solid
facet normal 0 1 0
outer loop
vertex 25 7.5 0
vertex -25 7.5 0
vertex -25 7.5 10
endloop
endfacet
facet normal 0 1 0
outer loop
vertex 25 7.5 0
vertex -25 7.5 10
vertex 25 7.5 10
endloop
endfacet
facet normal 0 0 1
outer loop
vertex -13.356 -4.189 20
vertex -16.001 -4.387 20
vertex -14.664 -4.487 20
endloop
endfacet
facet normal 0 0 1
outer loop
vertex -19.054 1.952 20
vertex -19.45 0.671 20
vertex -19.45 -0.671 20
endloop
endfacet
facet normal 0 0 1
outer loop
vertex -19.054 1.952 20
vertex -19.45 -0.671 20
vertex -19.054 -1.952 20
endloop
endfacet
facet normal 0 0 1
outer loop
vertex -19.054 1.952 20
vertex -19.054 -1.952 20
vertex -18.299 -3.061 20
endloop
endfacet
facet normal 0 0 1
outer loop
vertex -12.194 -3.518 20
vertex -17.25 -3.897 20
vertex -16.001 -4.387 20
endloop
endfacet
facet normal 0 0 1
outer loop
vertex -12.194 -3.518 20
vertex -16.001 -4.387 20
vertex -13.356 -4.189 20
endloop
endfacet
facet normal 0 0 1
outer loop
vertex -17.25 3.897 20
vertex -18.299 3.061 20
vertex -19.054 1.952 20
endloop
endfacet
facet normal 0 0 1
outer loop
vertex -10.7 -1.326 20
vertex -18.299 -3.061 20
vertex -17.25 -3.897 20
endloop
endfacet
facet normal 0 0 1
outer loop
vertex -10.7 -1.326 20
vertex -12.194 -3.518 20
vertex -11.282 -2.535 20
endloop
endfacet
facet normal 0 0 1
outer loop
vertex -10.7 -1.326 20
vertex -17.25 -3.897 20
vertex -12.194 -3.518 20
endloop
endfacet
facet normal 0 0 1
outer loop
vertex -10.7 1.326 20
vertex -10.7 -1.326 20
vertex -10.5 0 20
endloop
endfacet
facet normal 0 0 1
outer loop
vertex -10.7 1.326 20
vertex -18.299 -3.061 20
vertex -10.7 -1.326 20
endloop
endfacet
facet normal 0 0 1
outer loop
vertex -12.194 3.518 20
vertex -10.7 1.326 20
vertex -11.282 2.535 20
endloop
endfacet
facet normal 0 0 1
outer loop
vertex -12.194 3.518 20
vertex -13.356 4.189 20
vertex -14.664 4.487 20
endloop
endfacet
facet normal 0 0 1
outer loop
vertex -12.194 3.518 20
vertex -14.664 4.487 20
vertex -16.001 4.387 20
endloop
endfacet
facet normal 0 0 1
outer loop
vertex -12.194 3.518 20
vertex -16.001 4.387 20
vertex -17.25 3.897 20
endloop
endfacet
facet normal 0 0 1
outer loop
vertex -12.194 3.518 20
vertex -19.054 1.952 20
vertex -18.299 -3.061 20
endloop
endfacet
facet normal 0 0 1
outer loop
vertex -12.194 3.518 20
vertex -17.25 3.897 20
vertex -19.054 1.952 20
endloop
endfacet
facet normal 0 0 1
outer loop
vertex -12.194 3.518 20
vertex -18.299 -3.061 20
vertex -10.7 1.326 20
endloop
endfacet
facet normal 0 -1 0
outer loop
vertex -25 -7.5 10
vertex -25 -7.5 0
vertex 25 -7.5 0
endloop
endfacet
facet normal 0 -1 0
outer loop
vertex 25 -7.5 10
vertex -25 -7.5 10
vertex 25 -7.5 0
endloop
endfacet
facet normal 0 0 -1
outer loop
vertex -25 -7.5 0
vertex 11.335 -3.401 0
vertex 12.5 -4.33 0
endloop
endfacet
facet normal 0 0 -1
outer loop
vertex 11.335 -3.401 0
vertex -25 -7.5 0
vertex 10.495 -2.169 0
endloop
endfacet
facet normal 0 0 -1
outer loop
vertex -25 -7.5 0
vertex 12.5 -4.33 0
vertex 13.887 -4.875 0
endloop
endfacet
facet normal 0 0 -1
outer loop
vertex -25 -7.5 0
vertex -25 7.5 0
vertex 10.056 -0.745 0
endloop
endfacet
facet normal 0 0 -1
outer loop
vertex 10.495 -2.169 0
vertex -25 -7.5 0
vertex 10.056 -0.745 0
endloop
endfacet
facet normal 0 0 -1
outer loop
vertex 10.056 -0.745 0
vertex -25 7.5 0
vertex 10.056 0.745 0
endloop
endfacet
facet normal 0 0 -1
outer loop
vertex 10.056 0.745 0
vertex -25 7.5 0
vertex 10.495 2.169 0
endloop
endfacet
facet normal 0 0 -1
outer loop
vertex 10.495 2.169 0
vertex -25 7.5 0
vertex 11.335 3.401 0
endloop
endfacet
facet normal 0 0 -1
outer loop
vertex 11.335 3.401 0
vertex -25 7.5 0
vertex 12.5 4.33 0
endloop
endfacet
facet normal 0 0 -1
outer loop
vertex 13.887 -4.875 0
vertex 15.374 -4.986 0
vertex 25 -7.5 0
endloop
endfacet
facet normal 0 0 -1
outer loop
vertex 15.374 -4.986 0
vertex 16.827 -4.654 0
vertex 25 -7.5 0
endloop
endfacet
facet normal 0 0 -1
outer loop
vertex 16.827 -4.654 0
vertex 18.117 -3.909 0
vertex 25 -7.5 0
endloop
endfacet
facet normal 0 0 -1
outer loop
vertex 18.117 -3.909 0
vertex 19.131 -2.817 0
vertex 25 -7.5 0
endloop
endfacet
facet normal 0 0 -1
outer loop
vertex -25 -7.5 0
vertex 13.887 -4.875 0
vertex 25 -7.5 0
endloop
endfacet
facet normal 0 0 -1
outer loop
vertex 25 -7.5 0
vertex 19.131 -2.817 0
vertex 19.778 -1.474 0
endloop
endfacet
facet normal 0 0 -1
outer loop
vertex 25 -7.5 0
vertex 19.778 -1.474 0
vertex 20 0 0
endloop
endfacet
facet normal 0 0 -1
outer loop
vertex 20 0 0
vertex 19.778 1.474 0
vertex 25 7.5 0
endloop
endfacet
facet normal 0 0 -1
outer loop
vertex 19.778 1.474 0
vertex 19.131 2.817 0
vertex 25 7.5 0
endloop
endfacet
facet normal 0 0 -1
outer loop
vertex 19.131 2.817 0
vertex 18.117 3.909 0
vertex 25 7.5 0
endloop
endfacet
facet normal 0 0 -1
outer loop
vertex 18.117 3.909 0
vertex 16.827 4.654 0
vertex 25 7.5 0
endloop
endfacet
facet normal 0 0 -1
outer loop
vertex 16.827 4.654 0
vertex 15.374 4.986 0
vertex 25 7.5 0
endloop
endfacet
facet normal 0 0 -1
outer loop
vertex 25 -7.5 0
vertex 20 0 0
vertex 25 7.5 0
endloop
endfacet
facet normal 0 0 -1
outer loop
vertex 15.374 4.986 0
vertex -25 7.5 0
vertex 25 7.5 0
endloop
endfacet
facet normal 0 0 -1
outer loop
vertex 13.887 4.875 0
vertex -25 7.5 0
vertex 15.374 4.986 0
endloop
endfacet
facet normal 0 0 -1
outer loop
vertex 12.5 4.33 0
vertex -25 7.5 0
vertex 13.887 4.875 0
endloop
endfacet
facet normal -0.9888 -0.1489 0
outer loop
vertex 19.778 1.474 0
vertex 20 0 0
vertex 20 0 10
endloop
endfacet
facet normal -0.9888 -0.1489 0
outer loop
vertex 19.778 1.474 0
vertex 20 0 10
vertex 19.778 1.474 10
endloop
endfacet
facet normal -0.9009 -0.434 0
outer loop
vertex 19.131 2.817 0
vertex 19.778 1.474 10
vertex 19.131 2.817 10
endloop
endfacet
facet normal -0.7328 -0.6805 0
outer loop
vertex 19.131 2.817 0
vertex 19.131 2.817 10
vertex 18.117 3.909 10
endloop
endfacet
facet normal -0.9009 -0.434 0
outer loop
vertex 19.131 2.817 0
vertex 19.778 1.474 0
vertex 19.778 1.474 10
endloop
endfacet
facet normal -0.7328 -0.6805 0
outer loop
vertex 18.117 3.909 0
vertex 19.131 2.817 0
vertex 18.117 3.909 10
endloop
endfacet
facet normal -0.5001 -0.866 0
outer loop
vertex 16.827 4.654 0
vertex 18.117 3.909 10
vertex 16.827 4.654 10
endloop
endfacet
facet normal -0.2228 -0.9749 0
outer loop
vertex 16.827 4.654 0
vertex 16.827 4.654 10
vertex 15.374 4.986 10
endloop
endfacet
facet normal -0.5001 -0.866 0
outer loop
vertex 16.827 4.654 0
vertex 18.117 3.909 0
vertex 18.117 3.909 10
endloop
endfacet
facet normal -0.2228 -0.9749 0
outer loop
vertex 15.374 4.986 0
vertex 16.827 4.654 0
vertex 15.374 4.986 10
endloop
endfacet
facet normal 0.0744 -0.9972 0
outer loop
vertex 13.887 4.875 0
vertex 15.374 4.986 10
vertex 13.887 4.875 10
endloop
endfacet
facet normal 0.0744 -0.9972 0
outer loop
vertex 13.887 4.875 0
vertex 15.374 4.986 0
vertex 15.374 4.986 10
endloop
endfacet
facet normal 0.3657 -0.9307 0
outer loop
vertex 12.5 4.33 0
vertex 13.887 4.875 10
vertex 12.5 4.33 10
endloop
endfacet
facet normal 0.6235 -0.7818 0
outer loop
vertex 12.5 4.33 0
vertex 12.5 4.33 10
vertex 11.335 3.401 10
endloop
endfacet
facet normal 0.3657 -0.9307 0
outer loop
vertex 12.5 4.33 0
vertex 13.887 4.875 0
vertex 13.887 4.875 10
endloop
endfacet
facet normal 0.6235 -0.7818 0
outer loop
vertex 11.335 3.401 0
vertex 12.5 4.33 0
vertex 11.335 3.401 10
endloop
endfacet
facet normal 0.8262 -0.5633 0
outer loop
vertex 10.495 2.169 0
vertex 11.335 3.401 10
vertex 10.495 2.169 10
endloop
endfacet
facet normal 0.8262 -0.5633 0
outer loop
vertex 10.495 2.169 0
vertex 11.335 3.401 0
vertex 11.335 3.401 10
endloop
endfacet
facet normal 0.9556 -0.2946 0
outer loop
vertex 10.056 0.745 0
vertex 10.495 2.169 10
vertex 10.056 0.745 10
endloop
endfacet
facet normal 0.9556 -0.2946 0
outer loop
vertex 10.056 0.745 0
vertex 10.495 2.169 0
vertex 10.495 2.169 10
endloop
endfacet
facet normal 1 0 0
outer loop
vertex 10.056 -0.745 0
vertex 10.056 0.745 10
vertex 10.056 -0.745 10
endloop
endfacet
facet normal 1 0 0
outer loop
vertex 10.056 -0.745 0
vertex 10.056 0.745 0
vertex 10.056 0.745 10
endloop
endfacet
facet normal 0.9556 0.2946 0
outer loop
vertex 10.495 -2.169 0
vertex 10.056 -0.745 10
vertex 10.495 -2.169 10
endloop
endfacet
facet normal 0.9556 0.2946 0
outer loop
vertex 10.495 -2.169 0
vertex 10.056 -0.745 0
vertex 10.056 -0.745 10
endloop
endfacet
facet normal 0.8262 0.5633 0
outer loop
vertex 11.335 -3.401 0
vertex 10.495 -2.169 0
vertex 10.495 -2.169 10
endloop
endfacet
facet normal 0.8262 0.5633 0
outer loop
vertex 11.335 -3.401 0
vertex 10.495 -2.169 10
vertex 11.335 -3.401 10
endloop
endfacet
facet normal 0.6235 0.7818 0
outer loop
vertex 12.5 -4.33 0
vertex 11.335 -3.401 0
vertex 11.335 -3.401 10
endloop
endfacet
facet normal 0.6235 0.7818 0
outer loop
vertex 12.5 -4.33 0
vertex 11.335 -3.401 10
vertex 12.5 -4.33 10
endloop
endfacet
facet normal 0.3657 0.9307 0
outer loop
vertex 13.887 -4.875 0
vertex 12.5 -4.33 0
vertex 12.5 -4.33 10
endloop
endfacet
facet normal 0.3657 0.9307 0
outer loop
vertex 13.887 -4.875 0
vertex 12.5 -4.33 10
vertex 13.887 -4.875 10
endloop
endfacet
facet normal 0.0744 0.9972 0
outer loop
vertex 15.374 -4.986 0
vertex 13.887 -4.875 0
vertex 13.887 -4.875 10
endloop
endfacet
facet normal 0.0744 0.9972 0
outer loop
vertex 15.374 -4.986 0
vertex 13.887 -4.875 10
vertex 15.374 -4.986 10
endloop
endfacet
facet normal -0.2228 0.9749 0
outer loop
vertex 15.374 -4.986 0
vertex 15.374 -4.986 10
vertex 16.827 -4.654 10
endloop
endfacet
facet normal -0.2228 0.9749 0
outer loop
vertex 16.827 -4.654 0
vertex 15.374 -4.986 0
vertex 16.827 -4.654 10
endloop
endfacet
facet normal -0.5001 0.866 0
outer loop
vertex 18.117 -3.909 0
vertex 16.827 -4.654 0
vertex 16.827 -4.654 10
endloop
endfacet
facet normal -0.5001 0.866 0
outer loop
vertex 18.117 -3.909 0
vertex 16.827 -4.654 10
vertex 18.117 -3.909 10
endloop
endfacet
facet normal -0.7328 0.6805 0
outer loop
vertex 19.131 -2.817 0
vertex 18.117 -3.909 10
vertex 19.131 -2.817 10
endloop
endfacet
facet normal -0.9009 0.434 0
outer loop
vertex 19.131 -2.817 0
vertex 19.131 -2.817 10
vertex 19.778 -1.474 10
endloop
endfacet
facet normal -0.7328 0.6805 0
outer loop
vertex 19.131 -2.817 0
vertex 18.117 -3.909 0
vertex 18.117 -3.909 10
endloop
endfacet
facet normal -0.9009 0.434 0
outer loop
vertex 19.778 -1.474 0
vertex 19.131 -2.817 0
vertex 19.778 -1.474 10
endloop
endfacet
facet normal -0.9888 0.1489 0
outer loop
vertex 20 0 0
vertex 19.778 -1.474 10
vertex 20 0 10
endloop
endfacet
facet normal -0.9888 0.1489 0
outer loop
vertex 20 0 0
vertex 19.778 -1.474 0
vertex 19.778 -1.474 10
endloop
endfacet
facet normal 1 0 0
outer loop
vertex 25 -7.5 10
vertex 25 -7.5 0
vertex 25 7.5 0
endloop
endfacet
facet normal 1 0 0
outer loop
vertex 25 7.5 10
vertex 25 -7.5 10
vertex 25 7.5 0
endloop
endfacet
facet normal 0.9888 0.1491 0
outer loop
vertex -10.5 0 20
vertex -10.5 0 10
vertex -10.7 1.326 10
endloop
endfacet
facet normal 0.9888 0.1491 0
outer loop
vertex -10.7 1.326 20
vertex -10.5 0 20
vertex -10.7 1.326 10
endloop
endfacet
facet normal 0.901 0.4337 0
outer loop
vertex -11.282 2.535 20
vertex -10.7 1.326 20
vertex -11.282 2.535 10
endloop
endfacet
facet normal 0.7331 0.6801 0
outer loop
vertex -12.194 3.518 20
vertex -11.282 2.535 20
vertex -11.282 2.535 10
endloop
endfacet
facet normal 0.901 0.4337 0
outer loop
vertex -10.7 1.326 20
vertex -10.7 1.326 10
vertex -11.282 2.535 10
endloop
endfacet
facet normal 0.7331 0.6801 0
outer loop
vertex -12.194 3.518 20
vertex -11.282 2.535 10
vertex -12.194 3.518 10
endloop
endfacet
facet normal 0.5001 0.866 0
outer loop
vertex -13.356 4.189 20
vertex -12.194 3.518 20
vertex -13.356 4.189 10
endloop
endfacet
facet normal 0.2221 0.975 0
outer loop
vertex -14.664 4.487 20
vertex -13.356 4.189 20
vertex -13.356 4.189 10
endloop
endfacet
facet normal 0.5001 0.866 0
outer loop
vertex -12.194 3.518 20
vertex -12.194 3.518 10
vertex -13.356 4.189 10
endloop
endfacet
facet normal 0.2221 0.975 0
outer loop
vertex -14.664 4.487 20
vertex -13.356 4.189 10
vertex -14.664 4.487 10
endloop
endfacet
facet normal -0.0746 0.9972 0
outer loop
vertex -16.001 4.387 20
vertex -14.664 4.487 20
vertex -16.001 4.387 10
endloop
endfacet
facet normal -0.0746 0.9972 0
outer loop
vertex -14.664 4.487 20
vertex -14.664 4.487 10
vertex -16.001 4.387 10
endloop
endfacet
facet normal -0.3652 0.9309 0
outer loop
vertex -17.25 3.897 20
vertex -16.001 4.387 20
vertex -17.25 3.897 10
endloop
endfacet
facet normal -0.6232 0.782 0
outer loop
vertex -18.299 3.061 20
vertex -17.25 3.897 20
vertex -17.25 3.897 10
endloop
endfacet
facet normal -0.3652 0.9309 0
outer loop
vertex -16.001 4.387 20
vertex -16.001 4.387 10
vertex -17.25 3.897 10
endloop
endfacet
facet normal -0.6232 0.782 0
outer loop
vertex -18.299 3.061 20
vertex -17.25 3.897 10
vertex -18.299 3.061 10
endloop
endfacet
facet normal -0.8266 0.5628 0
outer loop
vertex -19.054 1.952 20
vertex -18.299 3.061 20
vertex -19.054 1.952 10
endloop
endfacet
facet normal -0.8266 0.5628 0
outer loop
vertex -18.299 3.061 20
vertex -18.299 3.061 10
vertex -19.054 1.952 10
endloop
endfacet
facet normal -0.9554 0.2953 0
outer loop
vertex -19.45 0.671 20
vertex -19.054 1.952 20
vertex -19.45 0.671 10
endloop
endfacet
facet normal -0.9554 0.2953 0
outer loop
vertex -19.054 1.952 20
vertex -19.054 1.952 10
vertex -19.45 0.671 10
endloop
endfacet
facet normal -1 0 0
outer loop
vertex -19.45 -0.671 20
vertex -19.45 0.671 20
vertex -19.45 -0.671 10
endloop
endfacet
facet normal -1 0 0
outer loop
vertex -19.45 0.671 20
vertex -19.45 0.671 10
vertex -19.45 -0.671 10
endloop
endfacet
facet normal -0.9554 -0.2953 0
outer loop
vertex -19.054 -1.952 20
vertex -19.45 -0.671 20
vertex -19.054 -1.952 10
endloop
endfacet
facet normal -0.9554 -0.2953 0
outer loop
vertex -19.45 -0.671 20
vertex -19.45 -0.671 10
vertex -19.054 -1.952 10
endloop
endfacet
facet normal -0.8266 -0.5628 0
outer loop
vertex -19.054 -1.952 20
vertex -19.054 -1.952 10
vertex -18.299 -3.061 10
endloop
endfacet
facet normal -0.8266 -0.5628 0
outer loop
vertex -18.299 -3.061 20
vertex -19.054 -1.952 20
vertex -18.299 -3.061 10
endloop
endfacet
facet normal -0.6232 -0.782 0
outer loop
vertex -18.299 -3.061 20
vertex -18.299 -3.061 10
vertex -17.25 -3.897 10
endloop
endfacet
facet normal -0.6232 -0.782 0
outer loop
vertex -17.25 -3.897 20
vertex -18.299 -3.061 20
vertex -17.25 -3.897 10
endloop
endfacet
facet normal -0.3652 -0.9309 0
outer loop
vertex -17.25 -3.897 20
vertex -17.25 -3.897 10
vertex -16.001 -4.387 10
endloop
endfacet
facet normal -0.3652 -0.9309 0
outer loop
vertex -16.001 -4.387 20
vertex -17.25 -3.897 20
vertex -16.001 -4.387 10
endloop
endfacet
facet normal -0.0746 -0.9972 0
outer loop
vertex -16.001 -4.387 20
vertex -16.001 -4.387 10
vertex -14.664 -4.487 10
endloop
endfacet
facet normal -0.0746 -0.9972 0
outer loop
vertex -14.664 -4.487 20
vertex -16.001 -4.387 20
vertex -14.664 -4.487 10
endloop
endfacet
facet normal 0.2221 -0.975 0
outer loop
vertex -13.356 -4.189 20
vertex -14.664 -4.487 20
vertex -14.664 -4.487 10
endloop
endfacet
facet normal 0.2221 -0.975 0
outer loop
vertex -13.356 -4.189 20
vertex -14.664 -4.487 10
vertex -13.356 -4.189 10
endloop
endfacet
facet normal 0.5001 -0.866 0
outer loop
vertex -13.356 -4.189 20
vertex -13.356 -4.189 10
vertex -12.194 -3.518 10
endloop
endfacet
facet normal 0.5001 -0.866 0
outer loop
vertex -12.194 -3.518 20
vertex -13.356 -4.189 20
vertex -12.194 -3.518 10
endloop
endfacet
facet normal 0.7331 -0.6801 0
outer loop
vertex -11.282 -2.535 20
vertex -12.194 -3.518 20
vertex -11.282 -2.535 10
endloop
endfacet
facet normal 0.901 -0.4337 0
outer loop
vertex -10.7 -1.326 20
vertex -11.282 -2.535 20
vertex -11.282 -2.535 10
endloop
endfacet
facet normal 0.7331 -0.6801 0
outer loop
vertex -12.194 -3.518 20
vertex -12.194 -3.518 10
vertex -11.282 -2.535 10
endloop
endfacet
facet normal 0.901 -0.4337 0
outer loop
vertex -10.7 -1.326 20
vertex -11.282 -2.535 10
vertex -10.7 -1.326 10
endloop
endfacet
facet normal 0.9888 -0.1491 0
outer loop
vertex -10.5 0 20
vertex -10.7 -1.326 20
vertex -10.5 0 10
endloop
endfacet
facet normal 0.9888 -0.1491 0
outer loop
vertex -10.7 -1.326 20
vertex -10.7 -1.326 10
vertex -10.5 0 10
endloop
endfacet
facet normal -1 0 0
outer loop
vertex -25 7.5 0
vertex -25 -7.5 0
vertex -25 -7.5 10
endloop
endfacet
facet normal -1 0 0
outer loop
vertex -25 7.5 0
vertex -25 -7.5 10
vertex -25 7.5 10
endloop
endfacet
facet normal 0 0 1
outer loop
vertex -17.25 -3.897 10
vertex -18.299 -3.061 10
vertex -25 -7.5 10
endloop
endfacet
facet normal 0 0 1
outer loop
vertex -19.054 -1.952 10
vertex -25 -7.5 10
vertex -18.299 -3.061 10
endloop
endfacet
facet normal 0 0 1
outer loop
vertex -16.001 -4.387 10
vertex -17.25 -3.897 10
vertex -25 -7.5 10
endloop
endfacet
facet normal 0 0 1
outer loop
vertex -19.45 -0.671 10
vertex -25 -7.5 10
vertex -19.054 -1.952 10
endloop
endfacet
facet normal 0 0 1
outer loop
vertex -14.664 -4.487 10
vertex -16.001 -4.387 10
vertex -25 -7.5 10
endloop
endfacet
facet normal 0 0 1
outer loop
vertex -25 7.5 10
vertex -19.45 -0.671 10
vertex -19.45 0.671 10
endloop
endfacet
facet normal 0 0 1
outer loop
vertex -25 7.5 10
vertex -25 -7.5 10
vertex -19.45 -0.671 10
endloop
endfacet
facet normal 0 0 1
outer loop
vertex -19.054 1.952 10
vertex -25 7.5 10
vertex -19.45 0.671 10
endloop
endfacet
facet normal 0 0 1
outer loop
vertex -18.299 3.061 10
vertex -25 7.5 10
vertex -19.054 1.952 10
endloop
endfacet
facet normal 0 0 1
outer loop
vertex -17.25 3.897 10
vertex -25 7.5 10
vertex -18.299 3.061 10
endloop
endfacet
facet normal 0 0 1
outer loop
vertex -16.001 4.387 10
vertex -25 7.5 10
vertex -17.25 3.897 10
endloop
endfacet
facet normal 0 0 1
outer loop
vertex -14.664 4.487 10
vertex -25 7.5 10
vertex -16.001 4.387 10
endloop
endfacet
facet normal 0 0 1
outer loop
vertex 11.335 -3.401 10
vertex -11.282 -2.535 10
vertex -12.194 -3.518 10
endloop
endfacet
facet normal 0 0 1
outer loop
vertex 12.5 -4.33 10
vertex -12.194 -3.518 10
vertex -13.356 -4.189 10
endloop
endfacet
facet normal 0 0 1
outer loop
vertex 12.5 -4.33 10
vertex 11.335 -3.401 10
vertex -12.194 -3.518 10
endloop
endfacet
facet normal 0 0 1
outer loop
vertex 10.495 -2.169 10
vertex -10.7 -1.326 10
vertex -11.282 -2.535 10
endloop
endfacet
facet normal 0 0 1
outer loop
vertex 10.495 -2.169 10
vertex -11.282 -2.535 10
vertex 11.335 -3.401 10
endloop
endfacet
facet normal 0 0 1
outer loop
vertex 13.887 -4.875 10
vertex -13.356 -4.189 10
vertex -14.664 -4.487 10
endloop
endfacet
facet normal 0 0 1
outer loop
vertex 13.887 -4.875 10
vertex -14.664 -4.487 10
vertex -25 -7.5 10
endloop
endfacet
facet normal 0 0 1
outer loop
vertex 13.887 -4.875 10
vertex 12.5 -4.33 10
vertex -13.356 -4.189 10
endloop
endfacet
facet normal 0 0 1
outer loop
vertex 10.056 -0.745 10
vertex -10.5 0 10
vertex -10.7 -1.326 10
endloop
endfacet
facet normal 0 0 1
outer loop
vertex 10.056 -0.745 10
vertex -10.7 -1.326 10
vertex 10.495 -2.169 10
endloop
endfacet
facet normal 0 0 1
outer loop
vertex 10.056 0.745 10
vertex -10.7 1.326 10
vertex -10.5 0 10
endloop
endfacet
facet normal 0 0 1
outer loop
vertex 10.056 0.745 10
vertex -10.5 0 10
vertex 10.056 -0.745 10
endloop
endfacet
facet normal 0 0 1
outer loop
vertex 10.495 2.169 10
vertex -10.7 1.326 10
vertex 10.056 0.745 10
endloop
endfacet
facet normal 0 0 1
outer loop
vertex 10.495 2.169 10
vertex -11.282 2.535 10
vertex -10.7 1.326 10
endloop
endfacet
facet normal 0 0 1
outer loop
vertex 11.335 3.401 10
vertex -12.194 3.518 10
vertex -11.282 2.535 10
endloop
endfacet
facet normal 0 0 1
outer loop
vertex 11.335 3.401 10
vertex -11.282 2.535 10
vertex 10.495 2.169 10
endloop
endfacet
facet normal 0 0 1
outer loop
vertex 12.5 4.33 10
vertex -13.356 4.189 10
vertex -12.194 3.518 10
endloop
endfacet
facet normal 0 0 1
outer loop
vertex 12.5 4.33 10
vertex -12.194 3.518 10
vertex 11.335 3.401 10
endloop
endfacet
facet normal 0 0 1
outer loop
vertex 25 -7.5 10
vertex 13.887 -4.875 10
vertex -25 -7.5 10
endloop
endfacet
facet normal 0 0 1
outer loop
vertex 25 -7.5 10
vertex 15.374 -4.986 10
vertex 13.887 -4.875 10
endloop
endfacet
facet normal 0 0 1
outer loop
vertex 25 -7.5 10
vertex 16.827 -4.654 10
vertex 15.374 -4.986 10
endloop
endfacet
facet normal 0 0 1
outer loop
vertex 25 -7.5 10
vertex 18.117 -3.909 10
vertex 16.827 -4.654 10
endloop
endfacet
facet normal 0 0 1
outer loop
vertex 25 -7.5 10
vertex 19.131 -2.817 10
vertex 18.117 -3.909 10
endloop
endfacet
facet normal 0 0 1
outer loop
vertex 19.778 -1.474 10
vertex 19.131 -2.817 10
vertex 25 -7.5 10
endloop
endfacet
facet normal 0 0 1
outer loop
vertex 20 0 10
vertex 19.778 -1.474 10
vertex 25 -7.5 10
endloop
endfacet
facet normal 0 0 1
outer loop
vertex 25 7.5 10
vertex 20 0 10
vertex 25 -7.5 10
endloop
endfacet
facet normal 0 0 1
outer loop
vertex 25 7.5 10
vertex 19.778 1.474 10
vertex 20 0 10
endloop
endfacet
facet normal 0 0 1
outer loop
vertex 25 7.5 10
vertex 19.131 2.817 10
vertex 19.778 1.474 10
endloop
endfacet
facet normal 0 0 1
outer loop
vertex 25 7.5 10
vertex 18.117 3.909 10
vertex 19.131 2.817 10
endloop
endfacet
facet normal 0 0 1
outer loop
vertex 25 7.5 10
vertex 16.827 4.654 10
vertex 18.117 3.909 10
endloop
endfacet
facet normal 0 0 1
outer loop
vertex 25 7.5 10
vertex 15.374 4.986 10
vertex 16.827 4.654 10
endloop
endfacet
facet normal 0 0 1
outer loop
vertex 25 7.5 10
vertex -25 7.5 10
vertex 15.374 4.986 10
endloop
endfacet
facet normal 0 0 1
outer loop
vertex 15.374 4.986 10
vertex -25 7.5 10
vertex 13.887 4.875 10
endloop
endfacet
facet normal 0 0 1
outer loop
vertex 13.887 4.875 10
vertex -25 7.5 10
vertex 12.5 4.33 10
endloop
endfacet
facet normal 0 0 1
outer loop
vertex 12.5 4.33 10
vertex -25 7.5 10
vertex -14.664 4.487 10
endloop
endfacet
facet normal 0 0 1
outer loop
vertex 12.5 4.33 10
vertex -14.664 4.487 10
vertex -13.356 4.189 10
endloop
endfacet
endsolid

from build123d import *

# Parameters (mm, degrees)
F0_W     = 50
F0_H     = 15
F0_R     = 5
F1_DEPTH = 10
F2_R     = 4.5
F3_DEPTH = 10


with BuildPart() as f1:
    # F0 (on Top) → F1 (new body)
    with BuildSketch(Plane.XY):
        Rectangle(F0_W, F0_H)
        with Locations((15, 0)):
            Circle(F0_R, mode=Mode.SUBTRACT)
    extrude(amount=F1_DEPTH)

    # F2 (on face) → F3 (join)
    with BuildSketch(Plane.XY.offset(10)):
        with Locations((-15, 0)):
            Circle(F2_R)
    extrude(amount=F3_DEPTH)


solid = f1.part
